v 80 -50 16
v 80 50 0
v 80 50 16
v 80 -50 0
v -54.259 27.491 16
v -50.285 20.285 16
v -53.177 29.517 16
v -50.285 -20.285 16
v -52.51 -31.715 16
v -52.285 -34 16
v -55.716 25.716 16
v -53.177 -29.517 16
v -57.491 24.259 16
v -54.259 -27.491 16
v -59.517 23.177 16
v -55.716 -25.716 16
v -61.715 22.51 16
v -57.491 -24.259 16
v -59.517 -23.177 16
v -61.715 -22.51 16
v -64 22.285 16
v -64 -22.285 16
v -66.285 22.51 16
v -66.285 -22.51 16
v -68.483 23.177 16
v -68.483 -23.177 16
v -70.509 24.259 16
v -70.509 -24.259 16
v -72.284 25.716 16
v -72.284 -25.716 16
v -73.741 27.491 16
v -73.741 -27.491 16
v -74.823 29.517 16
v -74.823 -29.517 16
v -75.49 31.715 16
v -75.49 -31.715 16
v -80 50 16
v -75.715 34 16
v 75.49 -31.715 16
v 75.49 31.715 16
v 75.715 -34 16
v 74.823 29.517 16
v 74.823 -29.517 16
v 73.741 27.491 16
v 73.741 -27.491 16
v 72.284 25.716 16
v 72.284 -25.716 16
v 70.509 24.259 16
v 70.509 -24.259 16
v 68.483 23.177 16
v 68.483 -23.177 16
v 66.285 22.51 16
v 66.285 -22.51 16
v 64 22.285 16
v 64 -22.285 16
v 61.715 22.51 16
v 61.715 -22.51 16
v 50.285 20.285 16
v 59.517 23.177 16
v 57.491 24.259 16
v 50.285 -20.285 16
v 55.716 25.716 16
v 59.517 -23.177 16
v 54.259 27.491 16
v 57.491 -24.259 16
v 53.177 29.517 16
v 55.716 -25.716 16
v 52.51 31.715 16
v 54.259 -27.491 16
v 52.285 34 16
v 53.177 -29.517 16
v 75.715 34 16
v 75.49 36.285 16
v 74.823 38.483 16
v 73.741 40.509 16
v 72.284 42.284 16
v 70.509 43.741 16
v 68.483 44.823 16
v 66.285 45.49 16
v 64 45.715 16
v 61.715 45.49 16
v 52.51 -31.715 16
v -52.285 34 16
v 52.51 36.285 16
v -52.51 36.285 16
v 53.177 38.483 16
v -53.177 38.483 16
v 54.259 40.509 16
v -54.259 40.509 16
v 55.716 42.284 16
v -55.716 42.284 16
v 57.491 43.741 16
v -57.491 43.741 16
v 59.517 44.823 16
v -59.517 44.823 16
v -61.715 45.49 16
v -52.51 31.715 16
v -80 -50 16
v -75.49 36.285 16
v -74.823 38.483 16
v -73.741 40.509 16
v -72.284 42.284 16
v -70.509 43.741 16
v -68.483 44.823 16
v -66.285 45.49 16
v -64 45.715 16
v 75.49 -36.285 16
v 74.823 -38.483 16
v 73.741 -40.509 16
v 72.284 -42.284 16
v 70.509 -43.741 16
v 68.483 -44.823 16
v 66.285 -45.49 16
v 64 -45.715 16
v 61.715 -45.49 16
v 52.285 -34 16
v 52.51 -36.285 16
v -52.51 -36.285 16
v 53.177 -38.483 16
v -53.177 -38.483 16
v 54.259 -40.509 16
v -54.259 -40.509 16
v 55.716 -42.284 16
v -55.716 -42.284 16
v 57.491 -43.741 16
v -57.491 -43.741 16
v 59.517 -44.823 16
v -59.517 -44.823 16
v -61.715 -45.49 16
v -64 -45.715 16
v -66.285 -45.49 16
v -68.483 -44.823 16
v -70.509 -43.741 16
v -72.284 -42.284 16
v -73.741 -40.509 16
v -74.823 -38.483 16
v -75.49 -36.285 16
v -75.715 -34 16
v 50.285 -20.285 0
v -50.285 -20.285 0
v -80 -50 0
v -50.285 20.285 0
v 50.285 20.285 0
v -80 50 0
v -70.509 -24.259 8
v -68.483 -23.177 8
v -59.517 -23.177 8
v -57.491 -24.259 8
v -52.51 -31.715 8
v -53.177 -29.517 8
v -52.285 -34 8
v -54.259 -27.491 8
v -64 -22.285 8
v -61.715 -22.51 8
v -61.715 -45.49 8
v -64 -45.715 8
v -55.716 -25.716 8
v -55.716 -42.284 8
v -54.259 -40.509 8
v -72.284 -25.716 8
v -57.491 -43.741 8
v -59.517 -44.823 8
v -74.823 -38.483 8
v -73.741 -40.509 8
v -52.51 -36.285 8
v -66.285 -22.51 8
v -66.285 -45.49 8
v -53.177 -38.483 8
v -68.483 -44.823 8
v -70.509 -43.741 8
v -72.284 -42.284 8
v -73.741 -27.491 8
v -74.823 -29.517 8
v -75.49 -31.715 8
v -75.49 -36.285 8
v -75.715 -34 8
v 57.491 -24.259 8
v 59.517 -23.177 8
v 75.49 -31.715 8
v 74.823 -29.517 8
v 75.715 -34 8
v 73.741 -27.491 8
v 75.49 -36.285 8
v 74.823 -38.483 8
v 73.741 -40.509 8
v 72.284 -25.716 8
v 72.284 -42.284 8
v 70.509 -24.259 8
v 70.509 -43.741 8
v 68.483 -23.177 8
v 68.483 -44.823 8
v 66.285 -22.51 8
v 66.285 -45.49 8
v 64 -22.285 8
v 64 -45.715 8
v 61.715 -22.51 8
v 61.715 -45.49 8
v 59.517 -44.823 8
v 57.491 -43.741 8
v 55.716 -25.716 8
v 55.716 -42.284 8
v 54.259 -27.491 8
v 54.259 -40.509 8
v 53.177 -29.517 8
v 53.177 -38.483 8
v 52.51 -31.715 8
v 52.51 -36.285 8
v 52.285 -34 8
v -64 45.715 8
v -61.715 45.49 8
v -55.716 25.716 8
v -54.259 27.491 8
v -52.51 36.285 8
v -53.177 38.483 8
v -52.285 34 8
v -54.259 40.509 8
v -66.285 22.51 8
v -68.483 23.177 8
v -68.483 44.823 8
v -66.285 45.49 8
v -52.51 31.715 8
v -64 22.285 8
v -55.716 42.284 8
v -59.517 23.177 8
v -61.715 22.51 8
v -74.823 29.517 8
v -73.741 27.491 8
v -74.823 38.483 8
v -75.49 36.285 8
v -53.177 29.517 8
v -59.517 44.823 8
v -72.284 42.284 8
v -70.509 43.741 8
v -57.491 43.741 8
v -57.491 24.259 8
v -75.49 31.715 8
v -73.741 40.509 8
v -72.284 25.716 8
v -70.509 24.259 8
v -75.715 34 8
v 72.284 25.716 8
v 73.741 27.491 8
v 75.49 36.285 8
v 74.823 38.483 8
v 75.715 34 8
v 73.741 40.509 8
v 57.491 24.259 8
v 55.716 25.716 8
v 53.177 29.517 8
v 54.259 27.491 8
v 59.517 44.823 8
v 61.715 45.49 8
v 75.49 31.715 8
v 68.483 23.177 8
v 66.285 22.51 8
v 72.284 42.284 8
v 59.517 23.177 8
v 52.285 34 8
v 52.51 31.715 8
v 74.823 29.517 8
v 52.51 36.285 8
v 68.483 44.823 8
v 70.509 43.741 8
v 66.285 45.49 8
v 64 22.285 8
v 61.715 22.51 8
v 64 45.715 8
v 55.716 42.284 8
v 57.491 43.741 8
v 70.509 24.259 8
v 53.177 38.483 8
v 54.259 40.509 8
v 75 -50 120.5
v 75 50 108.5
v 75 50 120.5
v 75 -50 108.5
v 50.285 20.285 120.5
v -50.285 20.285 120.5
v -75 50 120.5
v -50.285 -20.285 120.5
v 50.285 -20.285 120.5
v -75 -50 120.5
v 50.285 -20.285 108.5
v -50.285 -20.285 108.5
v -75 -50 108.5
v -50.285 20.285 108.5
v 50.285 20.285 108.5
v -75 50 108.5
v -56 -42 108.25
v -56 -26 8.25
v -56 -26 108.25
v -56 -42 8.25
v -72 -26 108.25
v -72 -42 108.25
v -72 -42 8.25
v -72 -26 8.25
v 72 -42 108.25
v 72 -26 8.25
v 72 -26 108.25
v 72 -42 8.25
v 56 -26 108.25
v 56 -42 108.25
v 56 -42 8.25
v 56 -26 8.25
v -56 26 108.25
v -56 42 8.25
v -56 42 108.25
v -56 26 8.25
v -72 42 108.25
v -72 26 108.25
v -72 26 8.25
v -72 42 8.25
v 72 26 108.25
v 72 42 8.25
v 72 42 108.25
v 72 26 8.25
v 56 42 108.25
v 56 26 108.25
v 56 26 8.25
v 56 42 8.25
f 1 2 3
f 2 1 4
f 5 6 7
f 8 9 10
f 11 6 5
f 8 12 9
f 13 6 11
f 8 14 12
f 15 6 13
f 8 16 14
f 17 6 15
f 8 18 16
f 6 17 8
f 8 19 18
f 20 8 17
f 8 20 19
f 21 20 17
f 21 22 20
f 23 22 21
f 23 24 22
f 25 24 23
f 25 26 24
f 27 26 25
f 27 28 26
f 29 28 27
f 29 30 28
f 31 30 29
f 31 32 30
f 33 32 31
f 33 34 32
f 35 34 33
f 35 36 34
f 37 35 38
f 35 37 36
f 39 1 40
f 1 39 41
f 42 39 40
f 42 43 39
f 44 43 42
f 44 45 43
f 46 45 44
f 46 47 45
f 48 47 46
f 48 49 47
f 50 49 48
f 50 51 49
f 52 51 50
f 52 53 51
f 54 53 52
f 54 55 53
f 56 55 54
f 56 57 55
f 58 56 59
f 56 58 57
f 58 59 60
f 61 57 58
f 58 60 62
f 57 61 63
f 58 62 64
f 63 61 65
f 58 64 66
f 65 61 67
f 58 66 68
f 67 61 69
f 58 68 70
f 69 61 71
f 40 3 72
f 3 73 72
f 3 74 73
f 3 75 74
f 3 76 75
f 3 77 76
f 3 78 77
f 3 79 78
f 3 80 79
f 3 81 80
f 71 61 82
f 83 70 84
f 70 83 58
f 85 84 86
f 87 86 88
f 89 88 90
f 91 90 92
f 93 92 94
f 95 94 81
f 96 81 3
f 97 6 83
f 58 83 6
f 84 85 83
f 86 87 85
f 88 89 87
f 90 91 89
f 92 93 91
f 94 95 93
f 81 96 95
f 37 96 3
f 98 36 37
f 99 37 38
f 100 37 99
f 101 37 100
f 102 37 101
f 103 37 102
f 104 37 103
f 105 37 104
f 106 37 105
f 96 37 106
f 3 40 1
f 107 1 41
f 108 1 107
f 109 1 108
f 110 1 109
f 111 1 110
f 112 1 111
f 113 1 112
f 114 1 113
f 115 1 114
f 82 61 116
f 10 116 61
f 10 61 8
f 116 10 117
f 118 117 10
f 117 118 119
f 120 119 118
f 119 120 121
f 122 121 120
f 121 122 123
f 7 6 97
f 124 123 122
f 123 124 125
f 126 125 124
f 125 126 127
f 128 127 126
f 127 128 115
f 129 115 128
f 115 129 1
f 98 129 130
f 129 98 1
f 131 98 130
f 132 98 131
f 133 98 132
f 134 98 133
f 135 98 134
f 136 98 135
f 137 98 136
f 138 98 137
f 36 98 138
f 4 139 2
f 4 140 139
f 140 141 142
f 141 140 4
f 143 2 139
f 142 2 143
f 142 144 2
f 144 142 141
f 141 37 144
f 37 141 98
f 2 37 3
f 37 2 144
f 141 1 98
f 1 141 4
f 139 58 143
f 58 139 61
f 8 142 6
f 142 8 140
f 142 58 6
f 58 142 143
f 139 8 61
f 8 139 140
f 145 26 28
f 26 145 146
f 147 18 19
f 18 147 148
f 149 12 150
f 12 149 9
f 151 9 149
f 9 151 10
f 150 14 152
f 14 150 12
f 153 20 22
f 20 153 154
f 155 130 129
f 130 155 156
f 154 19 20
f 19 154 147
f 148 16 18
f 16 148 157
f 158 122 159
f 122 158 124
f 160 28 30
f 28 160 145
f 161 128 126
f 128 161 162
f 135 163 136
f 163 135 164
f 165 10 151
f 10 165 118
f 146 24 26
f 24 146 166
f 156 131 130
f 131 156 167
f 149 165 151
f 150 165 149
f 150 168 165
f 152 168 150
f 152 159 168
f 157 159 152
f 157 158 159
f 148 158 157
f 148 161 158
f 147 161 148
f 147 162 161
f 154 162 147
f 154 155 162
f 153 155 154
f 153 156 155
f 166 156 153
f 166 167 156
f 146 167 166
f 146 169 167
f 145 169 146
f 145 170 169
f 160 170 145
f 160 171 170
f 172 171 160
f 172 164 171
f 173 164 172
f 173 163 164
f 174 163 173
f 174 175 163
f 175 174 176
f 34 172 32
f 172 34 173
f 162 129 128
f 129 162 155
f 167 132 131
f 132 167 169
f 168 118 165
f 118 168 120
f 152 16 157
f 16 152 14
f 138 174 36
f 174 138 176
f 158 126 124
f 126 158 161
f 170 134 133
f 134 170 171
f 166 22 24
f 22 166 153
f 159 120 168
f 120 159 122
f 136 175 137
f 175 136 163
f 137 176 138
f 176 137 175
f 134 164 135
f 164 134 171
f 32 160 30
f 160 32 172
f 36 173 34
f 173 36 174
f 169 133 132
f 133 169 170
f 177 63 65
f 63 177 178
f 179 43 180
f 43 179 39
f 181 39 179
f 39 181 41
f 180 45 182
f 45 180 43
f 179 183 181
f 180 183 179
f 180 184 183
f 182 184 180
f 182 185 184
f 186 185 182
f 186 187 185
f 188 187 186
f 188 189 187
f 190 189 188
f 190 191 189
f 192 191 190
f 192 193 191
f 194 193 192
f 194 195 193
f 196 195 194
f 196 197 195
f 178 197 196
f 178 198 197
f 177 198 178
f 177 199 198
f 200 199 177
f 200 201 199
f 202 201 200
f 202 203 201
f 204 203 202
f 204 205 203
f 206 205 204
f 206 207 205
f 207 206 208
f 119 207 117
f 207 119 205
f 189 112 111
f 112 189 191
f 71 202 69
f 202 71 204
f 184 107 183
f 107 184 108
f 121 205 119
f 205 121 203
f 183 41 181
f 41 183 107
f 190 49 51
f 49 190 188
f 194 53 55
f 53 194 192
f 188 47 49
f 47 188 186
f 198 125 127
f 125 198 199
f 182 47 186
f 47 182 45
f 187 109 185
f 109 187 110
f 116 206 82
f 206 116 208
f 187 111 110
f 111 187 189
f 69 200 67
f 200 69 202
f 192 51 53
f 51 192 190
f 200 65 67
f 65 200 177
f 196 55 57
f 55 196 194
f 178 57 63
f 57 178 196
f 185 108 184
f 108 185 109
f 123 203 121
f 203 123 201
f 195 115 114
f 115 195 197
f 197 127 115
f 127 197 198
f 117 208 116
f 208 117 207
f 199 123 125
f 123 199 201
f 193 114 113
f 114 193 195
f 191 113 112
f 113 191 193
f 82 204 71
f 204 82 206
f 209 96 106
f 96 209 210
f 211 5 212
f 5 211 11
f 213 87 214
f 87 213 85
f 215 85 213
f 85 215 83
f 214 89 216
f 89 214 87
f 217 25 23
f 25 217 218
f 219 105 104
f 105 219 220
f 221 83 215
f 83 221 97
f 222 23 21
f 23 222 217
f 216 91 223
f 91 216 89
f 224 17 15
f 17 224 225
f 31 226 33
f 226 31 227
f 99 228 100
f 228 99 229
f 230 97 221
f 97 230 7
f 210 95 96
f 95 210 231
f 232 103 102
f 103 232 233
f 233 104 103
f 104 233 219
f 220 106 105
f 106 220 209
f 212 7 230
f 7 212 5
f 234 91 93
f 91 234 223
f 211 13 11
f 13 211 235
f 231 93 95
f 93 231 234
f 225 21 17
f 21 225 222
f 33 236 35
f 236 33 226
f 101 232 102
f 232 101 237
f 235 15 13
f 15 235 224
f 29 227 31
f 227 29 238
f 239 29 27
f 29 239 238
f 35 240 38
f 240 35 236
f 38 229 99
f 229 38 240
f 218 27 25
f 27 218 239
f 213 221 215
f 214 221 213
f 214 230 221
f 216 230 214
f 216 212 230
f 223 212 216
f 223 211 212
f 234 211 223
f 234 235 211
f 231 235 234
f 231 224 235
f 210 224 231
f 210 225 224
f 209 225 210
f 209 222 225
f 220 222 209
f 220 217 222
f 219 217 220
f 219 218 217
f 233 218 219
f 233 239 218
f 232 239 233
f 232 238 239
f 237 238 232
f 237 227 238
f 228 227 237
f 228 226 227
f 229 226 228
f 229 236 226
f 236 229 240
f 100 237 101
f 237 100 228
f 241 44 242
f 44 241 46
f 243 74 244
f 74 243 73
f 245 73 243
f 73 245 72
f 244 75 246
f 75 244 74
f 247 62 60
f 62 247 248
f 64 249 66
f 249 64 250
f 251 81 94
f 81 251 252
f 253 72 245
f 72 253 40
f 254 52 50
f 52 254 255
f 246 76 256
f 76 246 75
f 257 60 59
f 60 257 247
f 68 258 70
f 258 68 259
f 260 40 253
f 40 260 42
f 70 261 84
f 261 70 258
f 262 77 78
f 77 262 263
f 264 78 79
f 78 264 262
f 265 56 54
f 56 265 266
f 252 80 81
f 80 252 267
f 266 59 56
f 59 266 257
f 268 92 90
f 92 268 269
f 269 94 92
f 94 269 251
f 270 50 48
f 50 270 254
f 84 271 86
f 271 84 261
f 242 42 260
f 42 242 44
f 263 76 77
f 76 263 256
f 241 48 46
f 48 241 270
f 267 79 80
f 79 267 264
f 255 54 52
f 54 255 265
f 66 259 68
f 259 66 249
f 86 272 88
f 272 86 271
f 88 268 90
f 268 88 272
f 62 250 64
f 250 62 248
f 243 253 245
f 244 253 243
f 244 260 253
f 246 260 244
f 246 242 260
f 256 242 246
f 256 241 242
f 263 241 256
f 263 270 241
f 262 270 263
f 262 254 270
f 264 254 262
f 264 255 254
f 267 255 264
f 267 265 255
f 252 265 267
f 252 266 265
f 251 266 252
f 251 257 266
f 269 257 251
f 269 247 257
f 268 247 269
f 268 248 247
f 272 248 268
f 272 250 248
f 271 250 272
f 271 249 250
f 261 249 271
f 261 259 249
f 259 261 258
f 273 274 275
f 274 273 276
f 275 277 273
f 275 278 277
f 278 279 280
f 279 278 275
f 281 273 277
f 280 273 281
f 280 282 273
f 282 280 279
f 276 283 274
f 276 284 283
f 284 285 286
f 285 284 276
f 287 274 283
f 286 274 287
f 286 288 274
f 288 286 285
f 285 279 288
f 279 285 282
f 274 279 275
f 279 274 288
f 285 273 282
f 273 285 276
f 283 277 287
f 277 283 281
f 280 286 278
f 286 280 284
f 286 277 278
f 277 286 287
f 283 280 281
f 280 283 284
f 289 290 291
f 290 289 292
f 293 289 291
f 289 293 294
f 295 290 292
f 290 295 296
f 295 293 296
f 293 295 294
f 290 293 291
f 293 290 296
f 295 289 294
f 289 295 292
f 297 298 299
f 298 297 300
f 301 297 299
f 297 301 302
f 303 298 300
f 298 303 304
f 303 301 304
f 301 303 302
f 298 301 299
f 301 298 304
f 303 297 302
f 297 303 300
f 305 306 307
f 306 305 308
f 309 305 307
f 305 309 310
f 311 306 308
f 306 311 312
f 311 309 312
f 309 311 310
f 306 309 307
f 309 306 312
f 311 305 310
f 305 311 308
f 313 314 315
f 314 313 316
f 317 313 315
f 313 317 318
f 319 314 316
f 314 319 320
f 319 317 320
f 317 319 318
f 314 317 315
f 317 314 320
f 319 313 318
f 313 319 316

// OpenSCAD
$fn = 32;

// ------------------------------------------------------------------------
// Frame cube: base 160 x 100 mm, posts 100 mm tall
// Every part is its own module, assembly() places every instance.
// ------------------------------------------------------------------------

// --- part 1 ---
module base_frame() {
  difference() {
    translate([-80, -50, 0]) cube([160, 100, 16]);
    translate([-50.285, -20.285, -1]) cube([100.57, 40.57, 18]);
    translate([-64, -34, 8]) cylinder(h = 9, d = 23.43);
    translate([64, -34, 8]) cylinder(h = 9, d = 23.43);
    translate([-64, 34, 8]) cylinder(h = 9, d = 23.43);
    translate([64, 34, 8]) cylinder(h = 9, d = 23.43);
  }
}

// --- part 2 ---
module corner_post() {
  translate([-8, -8, 0]) cube([16, 16, 100]);
}

// --- part 3 ---
module top_frame() {
  difference() {
    translate([-75, -50, 0]) cube([150, 100, 12]);
    translate([-50.285, -20.285, -1]) cube([100.57, 40.57, 14]);
  }
}

// --- assembly ---
module assembly() {
  color([0.80, 0.24, 0.20]) translate([0, 0, 0]) rotate([0, 0, 0]) base_frame();
  color([0.20, 0.45, 0.75]) translate([-64, -34, 8.25]) rotate([0, 0, 0]) corner_post();
  color([0.25, 0.62, 0.32]) translate([64, -34, 8.25]) rotate([0, 0, 0]) corner_post();
  color([0.92, 0.70, 0.18]) translate([-64, 34, 8.25]) rotate([0, 0, 0]) corner_post();
  color([0.58, 0.35, 0.70]) translate([64, 34, 8.25]) rotate([0, 0, 0]) corner_post();
  color([0.16, 0.66, 0.66]) translate([0, 0, 108.5]) rotate([0, 0, 0]) top_frame();
}

assembly();
